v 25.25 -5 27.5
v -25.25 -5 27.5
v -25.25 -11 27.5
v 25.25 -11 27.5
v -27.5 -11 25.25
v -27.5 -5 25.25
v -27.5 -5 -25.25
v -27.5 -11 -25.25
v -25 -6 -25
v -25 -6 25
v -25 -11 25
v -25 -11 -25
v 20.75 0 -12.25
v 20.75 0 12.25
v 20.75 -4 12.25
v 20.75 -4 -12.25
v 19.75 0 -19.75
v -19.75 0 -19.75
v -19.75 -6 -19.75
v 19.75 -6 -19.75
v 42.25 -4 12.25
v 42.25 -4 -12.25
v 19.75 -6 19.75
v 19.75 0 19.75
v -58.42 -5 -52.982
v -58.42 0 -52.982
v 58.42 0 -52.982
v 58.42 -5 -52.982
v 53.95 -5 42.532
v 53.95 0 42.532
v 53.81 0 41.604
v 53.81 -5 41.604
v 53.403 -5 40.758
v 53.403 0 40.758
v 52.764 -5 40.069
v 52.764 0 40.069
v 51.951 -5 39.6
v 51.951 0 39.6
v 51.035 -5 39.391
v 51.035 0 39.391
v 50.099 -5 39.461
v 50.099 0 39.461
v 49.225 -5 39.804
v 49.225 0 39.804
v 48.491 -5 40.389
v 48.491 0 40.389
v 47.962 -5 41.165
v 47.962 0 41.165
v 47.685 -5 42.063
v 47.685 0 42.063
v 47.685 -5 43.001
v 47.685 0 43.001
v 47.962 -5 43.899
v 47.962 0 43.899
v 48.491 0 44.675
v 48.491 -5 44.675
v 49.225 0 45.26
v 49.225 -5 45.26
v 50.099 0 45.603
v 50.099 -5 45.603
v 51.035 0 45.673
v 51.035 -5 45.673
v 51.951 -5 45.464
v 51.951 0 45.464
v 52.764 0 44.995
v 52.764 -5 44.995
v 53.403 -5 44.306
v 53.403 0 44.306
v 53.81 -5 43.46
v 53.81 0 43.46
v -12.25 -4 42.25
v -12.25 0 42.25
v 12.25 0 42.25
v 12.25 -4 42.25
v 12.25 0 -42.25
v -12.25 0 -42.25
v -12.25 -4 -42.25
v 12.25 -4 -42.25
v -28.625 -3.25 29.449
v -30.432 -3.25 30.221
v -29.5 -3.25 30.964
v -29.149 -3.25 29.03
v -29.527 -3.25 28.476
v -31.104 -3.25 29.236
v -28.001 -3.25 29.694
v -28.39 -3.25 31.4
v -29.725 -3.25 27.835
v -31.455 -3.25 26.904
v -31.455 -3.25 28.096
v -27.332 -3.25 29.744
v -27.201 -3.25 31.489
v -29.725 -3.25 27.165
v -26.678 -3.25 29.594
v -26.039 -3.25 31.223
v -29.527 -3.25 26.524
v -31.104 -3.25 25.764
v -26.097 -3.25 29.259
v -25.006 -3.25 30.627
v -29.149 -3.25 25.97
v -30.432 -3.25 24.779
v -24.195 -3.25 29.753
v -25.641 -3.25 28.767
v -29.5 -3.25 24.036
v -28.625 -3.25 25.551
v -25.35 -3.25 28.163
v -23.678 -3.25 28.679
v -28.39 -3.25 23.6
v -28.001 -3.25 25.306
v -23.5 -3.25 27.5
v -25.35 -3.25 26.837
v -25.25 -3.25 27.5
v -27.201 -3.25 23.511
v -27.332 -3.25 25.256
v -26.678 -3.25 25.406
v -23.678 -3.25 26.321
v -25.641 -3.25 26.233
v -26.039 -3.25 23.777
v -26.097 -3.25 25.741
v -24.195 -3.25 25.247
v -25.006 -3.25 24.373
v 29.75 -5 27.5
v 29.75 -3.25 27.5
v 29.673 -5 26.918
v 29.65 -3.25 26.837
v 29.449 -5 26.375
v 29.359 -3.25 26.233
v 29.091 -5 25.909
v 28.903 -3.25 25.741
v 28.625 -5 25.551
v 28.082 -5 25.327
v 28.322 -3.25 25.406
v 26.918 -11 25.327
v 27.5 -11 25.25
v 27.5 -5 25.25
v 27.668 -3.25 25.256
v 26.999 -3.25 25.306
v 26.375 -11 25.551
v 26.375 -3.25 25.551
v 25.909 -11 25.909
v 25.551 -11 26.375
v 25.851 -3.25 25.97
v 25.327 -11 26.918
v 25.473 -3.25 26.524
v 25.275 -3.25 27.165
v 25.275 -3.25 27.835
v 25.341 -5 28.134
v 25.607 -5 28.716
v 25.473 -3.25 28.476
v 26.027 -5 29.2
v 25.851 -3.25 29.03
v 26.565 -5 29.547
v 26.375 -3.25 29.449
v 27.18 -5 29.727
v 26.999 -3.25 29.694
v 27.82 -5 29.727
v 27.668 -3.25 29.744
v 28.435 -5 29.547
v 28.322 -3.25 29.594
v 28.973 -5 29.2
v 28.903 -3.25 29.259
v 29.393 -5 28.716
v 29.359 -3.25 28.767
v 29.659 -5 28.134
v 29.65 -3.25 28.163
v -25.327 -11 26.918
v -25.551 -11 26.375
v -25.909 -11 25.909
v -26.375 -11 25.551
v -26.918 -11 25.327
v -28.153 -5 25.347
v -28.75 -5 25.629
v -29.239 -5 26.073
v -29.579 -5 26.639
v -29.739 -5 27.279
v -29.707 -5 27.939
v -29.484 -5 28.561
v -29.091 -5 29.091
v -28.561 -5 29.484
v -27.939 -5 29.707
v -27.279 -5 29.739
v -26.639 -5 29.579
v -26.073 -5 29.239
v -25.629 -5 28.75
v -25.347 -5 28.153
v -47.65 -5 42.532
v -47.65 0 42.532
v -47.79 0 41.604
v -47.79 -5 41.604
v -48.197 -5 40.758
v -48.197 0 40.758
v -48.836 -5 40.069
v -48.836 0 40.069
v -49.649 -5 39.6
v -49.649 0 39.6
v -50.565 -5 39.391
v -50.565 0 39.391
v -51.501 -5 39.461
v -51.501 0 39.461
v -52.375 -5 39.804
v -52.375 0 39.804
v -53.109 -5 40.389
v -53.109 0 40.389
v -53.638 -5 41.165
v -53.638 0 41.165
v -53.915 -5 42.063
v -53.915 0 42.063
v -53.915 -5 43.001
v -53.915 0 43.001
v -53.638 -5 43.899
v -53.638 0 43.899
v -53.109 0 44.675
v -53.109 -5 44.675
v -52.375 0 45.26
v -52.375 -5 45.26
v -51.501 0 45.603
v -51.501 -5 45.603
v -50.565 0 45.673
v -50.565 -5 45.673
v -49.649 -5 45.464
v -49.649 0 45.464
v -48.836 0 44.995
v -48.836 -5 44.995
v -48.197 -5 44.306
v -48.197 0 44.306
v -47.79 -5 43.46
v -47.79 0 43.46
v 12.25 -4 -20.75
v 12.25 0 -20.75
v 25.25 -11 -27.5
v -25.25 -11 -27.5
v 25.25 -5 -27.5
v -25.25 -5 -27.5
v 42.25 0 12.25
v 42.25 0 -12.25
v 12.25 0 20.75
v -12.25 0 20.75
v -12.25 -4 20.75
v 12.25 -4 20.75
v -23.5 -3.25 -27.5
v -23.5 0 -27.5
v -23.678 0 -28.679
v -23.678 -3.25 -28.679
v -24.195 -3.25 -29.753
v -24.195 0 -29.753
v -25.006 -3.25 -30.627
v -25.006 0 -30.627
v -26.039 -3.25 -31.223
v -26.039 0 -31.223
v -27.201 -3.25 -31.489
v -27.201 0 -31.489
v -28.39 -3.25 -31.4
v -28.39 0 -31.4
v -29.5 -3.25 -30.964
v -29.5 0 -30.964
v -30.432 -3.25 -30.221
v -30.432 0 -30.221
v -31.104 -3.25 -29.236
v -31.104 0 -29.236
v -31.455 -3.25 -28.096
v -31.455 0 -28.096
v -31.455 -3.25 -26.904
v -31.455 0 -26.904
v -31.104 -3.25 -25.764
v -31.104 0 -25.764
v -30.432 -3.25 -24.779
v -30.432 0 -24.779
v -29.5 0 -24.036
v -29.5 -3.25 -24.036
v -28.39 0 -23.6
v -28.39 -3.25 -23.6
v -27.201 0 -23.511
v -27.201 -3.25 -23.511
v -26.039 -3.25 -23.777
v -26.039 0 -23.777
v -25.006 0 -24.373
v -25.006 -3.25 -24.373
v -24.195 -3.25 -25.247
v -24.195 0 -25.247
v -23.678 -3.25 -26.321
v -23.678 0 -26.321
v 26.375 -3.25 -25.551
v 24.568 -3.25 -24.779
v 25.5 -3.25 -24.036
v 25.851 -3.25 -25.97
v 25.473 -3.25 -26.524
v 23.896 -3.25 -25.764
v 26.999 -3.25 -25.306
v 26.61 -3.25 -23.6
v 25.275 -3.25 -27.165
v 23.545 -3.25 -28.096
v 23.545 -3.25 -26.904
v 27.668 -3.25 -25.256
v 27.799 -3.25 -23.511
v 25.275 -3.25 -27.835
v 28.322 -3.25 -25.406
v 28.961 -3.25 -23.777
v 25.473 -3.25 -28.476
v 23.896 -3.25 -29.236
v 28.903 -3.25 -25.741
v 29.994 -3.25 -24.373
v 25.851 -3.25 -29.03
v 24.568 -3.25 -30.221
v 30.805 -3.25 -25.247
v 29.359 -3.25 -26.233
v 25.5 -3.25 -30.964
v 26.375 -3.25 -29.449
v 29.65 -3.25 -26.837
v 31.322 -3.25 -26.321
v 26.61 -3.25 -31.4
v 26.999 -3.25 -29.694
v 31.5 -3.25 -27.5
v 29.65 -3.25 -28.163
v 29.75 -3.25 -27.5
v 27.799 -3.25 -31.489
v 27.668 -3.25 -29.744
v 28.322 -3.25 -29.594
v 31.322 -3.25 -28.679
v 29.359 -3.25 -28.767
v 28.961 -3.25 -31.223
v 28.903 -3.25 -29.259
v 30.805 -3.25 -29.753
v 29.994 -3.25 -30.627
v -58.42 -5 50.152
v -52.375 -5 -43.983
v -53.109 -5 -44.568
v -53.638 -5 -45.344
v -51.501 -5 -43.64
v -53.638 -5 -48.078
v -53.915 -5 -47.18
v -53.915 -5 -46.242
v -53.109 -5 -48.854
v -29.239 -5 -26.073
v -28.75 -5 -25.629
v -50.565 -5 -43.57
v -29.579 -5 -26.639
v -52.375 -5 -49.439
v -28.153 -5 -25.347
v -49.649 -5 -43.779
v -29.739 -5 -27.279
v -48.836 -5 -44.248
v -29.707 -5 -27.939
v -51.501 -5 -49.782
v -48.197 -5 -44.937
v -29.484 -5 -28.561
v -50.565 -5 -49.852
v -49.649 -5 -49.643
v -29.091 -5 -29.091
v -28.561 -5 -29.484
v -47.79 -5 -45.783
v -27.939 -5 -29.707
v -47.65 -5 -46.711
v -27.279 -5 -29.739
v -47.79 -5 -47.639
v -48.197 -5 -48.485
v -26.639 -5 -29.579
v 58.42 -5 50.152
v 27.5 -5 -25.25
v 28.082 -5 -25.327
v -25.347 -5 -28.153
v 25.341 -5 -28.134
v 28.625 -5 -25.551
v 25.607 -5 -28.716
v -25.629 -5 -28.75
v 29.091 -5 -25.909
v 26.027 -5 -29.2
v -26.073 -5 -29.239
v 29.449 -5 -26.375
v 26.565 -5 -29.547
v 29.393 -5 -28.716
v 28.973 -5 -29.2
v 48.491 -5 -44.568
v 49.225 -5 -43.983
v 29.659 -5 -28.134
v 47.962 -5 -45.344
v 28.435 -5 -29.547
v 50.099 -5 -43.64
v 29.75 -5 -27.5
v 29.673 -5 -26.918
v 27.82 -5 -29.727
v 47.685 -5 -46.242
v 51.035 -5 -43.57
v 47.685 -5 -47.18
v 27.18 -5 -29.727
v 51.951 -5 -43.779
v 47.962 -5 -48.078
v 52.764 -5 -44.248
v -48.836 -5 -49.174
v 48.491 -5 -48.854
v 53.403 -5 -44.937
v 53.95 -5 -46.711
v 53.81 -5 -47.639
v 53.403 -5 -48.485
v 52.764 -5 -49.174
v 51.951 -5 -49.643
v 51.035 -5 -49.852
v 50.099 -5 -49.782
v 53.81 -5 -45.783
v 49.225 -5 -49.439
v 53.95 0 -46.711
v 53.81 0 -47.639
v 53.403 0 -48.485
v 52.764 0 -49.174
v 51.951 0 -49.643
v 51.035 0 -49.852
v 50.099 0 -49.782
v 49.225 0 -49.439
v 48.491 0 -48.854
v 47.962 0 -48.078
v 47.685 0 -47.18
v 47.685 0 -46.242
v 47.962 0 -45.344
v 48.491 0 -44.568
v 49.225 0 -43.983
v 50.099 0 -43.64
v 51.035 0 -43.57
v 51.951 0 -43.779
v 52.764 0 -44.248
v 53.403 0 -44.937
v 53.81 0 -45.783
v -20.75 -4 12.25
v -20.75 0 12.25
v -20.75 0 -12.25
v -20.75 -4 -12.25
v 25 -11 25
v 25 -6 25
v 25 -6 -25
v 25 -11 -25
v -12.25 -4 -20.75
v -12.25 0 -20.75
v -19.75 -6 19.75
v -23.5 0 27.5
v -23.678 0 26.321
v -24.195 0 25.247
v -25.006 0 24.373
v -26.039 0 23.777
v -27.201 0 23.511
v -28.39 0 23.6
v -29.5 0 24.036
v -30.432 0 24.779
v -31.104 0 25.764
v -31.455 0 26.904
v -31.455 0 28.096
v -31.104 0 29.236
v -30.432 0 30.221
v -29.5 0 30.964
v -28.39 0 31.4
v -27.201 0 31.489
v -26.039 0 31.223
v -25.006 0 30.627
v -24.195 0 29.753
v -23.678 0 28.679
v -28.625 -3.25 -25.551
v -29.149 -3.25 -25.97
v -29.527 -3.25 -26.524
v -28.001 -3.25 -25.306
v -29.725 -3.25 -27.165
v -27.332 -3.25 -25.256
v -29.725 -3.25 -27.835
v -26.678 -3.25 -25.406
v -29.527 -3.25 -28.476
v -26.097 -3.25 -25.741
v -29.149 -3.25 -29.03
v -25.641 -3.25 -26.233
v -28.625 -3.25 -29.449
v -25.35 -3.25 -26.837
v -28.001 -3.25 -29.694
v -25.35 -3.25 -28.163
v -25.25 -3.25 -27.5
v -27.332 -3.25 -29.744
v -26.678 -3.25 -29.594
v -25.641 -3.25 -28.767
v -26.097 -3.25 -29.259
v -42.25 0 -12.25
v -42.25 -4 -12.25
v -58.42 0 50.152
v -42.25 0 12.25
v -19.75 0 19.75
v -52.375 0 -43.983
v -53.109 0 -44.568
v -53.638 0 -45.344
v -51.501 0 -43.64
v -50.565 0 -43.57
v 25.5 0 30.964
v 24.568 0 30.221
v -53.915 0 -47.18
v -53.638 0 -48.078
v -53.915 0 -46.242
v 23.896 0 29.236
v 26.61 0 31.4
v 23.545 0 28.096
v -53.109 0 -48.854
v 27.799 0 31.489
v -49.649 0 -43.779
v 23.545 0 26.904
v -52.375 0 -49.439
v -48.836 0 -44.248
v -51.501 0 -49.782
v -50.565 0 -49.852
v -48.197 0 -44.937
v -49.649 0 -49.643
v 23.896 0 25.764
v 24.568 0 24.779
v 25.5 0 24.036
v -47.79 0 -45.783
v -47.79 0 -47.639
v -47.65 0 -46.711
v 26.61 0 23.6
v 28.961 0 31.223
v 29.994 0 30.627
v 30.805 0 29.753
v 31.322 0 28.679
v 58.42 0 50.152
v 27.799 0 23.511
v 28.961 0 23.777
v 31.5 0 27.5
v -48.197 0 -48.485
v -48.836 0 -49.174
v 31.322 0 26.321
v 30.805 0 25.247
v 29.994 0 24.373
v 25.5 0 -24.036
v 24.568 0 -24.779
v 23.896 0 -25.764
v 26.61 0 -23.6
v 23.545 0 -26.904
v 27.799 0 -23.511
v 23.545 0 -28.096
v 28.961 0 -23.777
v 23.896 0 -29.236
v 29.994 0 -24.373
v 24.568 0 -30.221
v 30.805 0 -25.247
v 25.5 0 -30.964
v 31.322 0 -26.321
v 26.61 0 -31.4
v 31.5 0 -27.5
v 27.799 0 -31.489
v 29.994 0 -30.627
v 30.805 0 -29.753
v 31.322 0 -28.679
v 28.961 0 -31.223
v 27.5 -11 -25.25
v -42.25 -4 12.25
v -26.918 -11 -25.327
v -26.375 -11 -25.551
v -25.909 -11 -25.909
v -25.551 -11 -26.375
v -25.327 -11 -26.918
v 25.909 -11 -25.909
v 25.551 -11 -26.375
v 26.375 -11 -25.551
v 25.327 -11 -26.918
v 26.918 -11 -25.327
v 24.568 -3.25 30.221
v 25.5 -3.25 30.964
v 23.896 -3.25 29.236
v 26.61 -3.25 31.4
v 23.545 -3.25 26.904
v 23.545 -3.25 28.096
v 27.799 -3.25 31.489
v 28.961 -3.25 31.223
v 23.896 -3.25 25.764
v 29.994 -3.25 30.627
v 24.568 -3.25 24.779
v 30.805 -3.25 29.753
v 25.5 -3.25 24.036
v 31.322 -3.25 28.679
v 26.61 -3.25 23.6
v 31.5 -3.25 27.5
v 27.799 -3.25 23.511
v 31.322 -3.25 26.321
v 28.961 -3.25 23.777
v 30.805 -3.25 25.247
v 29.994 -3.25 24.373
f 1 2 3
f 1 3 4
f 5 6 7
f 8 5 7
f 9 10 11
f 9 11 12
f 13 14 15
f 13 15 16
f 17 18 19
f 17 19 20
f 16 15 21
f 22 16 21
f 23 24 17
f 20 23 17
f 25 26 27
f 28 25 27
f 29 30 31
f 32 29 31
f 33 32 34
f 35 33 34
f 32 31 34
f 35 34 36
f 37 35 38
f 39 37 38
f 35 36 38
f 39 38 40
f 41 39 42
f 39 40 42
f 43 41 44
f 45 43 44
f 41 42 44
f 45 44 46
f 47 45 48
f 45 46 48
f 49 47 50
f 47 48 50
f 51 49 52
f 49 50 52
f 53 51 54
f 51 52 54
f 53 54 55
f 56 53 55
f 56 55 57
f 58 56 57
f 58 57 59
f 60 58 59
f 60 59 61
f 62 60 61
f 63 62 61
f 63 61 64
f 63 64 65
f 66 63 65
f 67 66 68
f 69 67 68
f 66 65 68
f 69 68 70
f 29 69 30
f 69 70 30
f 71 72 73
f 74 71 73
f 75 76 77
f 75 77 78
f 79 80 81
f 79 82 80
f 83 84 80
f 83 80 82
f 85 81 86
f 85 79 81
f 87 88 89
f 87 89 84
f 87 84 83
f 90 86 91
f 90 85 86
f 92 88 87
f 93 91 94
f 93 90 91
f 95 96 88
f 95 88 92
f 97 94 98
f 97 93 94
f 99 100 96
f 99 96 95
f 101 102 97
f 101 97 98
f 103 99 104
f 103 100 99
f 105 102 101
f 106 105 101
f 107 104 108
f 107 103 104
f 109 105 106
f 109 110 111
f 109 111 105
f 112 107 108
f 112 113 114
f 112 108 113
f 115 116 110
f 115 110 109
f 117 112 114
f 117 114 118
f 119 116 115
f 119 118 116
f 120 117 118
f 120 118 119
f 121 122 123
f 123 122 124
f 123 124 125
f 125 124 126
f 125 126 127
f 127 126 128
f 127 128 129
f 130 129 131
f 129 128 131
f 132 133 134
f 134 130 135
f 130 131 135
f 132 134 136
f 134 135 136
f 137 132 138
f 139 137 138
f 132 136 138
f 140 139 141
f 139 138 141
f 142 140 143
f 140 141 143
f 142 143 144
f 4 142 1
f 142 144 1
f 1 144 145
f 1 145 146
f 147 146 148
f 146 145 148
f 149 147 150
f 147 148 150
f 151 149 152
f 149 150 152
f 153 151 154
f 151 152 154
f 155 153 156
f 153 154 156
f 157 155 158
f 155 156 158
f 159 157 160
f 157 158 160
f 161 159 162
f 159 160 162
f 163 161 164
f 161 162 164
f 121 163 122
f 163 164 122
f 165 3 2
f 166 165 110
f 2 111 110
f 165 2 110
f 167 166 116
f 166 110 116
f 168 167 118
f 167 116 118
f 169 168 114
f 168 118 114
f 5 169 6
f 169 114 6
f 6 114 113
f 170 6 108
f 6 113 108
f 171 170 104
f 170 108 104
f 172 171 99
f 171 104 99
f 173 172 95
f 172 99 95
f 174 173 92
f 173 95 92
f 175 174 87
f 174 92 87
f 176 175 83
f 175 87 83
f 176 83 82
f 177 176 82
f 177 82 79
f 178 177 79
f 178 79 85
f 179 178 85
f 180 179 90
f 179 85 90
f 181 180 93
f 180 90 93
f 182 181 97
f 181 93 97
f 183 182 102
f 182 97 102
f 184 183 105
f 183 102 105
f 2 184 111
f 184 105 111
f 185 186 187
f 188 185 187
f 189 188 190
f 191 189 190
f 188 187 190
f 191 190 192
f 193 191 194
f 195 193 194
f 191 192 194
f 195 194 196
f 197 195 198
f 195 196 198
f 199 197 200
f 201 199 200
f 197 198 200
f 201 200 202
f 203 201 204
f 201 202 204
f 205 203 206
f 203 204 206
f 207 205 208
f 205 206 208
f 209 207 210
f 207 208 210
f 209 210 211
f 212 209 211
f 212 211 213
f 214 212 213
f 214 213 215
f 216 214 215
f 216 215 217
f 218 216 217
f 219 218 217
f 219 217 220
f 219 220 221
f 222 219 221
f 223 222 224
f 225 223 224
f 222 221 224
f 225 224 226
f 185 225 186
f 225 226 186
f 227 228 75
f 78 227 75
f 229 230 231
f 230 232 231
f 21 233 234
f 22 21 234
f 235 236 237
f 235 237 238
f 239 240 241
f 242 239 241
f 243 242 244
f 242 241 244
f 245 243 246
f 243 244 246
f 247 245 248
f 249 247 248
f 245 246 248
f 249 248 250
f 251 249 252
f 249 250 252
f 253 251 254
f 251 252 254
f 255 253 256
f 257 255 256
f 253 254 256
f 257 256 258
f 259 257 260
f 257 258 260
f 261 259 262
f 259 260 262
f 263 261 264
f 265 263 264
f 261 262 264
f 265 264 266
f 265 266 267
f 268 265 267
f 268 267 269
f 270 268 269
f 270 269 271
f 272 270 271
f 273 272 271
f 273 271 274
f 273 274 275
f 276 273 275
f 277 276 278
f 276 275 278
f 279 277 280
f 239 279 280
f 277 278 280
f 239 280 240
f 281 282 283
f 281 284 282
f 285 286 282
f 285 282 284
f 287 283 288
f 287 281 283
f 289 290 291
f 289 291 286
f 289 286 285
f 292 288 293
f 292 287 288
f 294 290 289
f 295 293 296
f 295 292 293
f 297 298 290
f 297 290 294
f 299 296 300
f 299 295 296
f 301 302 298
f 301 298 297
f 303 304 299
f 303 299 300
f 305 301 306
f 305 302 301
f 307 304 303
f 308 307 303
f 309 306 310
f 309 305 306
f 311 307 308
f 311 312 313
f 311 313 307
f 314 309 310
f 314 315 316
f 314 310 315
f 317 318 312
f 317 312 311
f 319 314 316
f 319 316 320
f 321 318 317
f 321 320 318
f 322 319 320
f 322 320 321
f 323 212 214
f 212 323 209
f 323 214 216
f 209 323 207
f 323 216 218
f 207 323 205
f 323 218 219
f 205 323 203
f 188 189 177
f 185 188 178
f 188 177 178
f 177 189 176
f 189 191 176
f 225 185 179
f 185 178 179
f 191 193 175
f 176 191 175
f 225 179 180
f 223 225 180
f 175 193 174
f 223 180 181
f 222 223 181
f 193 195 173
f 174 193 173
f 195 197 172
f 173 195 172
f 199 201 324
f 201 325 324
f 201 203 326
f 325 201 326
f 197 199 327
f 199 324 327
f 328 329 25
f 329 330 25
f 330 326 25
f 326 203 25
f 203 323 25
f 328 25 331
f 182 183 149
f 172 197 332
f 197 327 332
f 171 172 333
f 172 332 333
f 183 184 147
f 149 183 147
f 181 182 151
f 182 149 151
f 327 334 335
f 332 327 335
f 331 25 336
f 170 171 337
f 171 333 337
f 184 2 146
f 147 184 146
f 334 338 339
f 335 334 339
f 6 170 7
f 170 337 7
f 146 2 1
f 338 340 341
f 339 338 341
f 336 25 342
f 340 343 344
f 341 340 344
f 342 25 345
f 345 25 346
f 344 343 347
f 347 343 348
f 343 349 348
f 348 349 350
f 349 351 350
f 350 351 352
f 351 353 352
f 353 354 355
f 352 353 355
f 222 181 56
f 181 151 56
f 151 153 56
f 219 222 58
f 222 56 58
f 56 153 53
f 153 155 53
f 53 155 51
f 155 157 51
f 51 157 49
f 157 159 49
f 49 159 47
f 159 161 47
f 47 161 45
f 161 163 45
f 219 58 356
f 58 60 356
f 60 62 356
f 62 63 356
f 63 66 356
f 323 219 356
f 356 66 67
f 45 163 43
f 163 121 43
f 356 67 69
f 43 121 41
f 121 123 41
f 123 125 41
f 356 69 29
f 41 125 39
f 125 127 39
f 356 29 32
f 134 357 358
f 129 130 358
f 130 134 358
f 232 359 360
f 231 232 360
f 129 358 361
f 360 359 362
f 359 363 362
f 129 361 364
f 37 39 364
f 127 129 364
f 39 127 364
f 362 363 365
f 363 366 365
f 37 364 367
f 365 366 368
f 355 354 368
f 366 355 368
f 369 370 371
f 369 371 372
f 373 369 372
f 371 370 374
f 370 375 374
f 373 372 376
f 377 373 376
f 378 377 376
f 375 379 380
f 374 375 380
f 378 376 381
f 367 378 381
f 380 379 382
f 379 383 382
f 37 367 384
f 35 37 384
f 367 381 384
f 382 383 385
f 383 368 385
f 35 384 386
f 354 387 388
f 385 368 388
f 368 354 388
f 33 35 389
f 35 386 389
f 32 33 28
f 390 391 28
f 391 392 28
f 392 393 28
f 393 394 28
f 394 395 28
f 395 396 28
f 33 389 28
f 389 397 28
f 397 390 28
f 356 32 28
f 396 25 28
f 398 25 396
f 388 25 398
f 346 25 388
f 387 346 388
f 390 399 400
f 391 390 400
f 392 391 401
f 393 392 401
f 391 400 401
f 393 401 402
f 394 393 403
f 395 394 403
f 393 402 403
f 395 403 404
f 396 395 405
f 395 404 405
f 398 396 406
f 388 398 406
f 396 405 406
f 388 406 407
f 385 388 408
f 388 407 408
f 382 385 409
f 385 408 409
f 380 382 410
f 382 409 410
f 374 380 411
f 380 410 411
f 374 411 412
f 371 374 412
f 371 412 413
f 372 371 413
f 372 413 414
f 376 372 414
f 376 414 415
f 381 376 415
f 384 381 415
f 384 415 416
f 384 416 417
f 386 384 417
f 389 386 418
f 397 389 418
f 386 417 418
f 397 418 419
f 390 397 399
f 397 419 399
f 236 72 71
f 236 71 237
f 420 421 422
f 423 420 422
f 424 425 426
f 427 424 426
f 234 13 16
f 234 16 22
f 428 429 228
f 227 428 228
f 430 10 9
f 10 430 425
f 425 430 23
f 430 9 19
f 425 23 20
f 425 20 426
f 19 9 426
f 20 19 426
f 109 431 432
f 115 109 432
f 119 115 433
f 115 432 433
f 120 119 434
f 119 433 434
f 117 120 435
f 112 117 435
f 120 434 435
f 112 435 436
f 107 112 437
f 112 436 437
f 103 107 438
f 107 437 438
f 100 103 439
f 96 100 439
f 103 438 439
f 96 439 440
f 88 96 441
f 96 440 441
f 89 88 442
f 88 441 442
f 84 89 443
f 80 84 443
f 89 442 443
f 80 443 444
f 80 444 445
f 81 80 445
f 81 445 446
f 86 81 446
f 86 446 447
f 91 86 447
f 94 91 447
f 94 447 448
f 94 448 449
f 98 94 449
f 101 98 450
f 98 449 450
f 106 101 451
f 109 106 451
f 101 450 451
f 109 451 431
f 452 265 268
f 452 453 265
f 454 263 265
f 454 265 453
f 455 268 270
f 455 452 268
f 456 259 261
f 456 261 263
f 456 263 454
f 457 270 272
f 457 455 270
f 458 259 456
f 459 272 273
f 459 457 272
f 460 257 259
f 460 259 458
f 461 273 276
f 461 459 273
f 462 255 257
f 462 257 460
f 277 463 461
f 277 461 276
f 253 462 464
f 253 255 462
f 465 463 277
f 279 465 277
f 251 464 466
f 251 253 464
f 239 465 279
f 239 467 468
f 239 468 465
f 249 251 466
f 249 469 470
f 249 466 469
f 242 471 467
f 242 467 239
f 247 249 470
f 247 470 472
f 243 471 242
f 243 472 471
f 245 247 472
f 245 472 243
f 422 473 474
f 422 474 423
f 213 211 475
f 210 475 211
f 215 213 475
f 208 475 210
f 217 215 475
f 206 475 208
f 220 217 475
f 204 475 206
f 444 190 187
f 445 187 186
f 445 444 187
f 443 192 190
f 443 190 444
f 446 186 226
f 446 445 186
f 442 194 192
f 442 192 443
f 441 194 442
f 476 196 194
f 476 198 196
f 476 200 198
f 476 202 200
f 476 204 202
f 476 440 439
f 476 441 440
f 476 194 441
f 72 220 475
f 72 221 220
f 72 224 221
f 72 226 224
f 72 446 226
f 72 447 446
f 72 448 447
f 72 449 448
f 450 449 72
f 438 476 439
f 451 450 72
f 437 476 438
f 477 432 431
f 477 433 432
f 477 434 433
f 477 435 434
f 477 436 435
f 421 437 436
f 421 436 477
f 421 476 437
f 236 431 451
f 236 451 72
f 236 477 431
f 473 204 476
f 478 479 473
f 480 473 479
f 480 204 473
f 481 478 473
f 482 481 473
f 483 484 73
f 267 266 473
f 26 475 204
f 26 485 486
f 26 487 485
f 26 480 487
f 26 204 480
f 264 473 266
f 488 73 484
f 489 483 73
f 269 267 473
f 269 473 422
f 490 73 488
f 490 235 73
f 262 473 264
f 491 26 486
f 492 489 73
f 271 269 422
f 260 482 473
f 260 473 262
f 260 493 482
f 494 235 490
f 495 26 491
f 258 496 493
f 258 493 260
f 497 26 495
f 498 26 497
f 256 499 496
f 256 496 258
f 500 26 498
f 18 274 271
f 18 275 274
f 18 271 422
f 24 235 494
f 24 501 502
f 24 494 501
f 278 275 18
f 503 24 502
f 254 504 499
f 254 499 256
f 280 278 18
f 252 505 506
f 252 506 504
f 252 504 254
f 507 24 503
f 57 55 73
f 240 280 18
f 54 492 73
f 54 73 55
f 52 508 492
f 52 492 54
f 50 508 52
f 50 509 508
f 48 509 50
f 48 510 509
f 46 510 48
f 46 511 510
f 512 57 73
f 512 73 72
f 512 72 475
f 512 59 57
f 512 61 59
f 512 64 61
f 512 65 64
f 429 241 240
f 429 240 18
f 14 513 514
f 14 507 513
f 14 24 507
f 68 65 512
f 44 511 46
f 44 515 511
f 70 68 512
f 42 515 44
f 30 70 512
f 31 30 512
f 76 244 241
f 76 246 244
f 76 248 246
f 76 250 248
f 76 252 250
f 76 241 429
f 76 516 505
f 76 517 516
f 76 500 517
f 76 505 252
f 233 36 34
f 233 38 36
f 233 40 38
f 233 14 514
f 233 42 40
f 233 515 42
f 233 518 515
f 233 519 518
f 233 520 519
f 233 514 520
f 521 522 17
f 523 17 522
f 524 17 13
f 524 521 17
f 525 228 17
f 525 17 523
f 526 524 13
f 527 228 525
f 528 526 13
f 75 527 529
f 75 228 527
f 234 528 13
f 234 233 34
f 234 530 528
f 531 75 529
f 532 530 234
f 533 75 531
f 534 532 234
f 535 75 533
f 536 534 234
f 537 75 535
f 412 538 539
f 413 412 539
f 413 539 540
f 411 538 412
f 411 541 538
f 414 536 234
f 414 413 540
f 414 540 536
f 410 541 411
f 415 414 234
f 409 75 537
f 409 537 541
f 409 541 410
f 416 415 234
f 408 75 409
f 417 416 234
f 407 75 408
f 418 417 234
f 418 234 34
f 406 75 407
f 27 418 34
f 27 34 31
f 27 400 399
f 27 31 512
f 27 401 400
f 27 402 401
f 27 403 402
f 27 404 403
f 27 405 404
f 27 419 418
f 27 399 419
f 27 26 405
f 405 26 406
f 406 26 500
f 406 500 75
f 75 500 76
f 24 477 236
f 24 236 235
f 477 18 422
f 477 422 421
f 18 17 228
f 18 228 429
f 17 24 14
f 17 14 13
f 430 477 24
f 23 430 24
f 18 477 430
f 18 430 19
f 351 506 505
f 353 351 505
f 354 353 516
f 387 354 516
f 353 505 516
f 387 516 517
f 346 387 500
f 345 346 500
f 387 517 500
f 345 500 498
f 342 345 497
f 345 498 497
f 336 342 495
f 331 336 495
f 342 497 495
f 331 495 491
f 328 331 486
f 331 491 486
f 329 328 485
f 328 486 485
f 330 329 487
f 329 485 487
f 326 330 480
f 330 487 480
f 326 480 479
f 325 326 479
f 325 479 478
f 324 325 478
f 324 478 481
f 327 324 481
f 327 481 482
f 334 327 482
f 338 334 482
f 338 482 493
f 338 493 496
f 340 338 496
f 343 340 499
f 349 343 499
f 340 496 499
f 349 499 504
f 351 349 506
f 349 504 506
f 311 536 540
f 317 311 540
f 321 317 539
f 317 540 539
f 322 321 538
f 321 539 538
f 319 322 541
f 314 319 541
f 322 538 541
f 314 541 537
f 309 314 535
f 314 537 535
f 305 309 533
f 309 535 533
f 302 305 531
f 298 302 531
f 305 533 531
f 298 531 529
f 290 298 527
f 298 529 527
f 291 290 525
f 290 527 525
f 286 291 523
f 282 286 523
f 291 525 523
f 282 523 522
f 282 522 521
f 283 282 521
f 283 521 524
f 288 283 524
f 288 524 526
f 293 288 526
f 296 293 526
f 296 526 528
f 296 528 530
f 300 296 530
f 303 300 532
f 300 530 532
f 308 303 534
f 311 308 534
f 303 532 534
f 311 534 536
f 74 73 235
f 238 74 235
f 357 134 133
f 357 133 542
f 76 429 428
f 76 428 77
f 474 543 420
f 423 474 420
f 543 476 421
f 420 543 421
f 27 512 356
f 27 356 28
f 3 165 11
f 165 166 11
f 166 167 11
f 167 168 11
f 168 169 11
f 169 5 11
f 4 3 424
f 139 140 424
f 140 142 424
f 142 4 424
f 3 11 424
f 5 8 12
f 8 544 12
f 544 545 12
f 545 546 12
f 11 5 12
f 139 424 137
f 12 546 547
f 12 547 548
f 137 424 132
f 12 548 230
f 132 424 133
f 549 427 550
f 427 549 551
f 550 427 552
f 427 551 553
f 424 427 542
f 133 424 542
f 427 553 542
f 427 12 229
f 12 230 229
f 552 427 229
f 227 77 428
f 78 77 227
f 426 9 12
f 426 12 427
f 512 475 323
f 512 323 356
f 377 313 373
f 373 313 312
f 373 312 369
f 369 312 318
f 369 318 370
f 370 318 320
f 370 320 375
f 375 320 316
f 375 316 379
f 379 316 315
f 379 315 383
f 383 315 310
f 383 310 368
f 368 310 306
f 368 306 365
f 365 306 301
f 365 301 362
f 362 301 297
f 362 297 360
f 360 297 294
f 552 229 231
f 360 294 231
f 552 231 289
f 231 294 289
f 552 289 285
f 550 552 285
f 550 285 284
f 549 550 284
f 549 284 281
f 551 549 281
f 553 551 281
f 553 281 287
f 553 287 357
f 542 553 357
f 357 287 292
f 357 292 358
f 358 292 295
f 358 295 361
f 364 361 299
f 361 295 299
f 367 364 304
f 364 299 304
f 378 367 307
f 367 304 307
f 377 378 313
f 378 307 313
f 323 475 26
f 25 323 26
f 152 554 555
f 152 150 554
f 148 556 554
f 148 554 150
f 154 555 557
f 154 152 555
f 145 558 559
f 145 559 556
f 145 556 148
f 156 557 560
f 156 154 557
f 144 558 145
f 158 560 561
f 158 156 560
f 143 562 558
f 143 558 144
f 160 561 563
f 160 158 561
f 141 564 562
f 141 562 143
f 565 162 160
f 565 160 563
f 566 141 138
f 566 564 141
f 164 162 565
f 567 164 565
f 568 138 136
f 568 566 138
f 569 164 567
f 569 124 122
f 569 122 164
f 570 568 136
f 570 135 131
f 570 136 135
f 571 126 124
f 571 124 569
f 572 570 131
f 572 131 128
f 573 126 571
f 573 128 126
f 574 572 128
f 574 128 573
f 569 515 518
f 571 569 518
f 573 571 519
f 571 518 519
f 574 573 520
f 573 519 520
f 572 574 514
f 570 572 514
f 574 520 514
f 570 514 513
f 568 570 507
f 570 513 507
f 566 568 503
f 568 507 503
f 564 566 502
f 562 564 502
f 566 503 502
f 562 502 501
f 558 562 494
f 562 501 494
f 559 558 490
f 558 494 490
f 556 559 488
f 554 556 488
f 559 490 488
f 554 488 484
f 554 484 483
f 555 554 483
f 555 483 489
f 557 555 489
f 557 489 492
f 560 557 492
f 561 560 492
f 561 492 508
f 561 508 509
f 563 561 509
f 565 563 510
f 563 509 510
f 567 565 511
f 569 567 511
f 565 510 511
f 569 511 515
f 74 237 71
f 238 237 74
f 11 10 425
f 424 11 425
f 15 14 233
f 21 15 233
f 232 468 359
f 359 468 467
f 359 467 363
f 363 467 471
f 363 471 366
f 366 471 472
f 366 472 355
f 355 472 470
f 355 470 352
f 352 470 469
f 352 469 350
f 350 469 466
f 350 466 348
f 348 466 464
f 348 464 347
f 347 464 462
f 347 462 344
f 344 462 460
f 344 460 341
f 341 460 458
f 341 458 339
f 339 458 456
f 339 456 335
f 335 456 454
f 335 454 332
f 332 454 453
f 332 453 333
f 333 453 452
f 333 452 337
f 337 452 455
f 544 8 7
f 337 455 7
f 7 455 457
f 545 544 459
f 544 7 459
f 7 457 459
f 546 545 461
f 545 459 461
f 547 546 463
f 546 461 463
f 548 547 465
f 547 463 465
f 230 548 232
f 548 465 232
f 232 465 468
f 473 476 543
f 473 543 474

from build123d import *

# Parameters (mm, degrees)
SKETCH1_W              = 116.84
SKETCH1_H              = 103.134084814
SKETCH1_R              = 3.15
BOSS_EXTRUDE1_DEPTH    = 5
SKETCH12_W             = 85
SKETCH12_H             = 23.975046692
BOSS_EXTRUDE15_DEPTH   = 5
SKETCH17_W             = 50
SKETCH17_H             = 50
BOSS_EXTRUDE18_DEPTH   = 6
SKETCH10_W             = 39.5
SKETCH10_H             = 39.5
BOSS_EXTRUDE19_DEPTH   = 25
SKETCH19_W             = 55
SKETCH19_H             = 55
BOSS_EXTRUDE20_DEPTH   = 11
SKETCH20_R             = 2.25
BOSS_EXTRUDE22_DEPTH   = 25
BOSS_EXTRUDE22_2_DEPTH = 25
BOSS_EXTRUDE22_3_DEPTH = 25
BOSS_EXTRUDE22_4_DEPTH = 25
SKETCH21_W             = 24.5
SKETCH21_H             = 21.5
BOSS_EXTRUDE23_DEPTH   = 4
SKETCH21_W_2           = 21.5
SKETCH21_H_2           = 24.5
BOSS_EXTRUDE23_2_DEPTH = 4
BOSS_EXTRUDE23_3_DEPTH = 4
BOSS_EXTRUDE23_4_DEPTH = 4
SKETCH25_R             = 4
BOSS_EXTRUDE24_DEPTH   = 3.25
BOSS_EXTRUDE24_2_DEPTH = 3.25
BOSS_EXTRUDE24_3_DEPTH = 3.25
BOSS_EXTRUDE24_4_DEPTH = 3.25


with BuildPart() as part:
    # Sketch1 → Boss-Extrude1 (new body)
    with BuildSketch(Plane(origin=(0, 0, 0), x_dir=(1, 0, 0), z_dir=(0, 1, 0))):
        with Locations((0, 1.415042407)):
            Rectangle(SKETCH1_W, SKETCH1_H)
        with Locations((-50.8, 46.711)):
            Circle(SKETCH1_R, mode=Mode.SUBTRACT)
        with Locations((50.8, -42.532)):
            Circle(SKETCH1_R, mode=Mode.SUBTRACT)
        with Locations((-50.8, -42.532)):
            Circle(SKETCH1_R, mode=Mode.SUBTRACT)
        with Locations((50.8, 46.711)):
            Circle(SKETCH1_R, mode=Mode.SUBTRACT)
    extrude(amount=-BOSS_EXTRUDE1_DEPTH)


with BuildPart() as body_2:
    # Sketch12 → Boss-Extrude15 (new body)
    with BuildSketch(Plane(origin=(0, 0, 0), x_dir=(1, 0, 0), z_dir=(0, 1, 0))):
        with Locations((0, 58)):
            Rectangle(SKETCH12_W, SKETCH12_H)
    extrude(amount=BOSS_EXTRUDE15_DEPTH)


with BuildPart() as body_3:
    # Sketch17 → Boss-Extrude18 (new body)
    with BuildSketch(Plane(origin=(0, 0, 0), x_dir=(1, 0, 0), z_dir=(0, 1, 0))):
        Rectangle(SKETCH17_W, SKETCH17_H)
    extrude(amount=-BOSS_EXTRUDE18_DEPTH)


with BuildPart() as body_4:
    # Sketch10 → Boss-Extrude19 (new body, symmetric)
    with BuildSketch(Plane(origin=(0, 0, 0), x_dir=(1, 0, 0), z_dir=(0, 1, 0))):
        Rectangle(SKETCH10_W, SKETCH10_H)
    extrude(amount=BOSS_EXTRUDE19_DEPTH, both=True)


with BuildPart() as body_5:
    # Sketch19 → Boss-Extrude20 (new body)
    with BuildSketch(Plane(origin=(0, 0, 0), x_dir=(1, 0, 0), z_dir=(0, 1, 0))):
        Rectangle(SKETCH19_W, SKETCH19_H)
    extrude(amount=-BOSS_EXTRUDE20_DEPTH)


with BuildPart() as part_1:
    add(part.part)

    # Combine1: cut body 2
    add(body_2.part, mode=Mode.SUBTRACT)


with BuildPart() as body_3_1:
    # Body-Move/Copy4: moved
    add(body_3.part.moved(Location((0, -6, 0))))


with BuildPart() as body_5_1:
    add(body_5.part)

    # Combine4: cut body 3
    add(body_3_1.part, mode=Mode.SUBTRACT)

    # Combine7: union part
    add(part_1.part)

    # Combine8: cut body 4
    add(body_4.part, mode=Mode.SUBTRACT)


with BuildPart() as body_2_2:
    # Sketch20 → Boss-Extrude22 (new body, symmetric)
    with BuildSketch(Plane(origin=(0, 0, 0), x_dir=(1, 0, 0), z_dir=(0, 1, 0))):
        with Locations((27.5, 27.5)):
            Circle(SKETCH20_R)
    extrude(amount=BOSS_EXTRUDE22_DEPTH, both=True)


with BuildPart() as body_3_2:
    # Sketch20 → Boss-Extrude22 2 (new body, symmetric)
    with BuildSketch(Plane(origin=(0, 0, 0), x_dir=(1, 0, 0), z_dir=(0, 1, 0))):
        with Locations((27.5, -27.5)):
            Circle(SKETCH20_R)
    extrude(amount=BOSS_EXTRUDE22_2_DEPTH, both=True)


with BuildPart() as body_4_2:
    # Sketch20 → Boss-Extrude22 3 (new body, symmetric)
    with BuildSketch(Plane(origin=(0, 0, 0), x_dir=(1, 0, 0), z_dir=(0, 1, 0))):
        with Locations((-27.5, -27.5)):
            Circle(SKETCH20_R)
    extrude(amount=BOSS_EXTRUDE22_3_DEPTH, both=True)


with BuildPart() as body_5_2:
    # Sketch20 → Boss-Extrude22 4 (new body, symmetric)
    with BuildSketch(Plane(origin=(0, 0, 0), x_dir=(1, 0, 0), z_dir=(0, 1, 0))):
        with Locations((-27.5, 27.5)):
            Circle(SKETCH20_R)
    extrude(amount=BOSS_EXTRUDE22_4_DEPTH, both=True)


with BuildPart() as body_5_3:
    add(body_5_1.part)

    # Combine9: cut body 4 2, body 3 2, body 2 2, body 5 2
    add(body_4_2.part, mode=Mode.SUBTRACT)
    add(body_3_2.part, mode=Mode.SUBTRACT)
    add(body_2_2.part, mode=Mode.SUBTRACT)
    add(body_5_2.part, mode=Mode.SUBTRACT)


with BuildPart() as body_2_3:
    # Sketch21 → Boss-Extrude23 (new body)
    with BuildSketch(Plane(origin=(0, 0, 0), x_dir=(1, 0, 0), z_dir=(0, 1, 0))):
        with Locations((0, 31.5)):
            Rectangle(SKETCH21_W, SKETCH21_H)
    extrude(amount=-BOSS_EXTRUDE23_DEPTH)


with BuildPart() as body_3_3:
    # Sketch21 → Boss-Extrude23 2 (new body)
    with BuildSketch(Plane(origin=(0, 0, 0), x_dir=(1, 0, 0), z_dir=(0, 1, 0))):
        with Locations((31.5, 0)):
            Rectangle(SKETCH21_W_2, SKETCH21_H_2)
    extrude(amount=-BOSS_EXTRUDE23_2_DEPTH)


with BuildPart() as body_4_3:
    # Sketch21 → Boss-Extrude23 3 (new body)
    with BuildSketch(Plane(origin=(0, 0, 0), x_dir=(1, 0, 0), z_dir=(0, 1, 0))):
        with Locations((-31.5, 0)):
            Rectangle(SKETCH21_W_2, SKETCH21_H_2)
    extrude(amount=-BOSS_EXTRUDE23_3_DEPTH)


with BuildPart() as body_5_3_1:
    # Sketch21 → Boss-Extrude23 4 (new body)
    with BuildSketch(Plane(origin=(0, 0, 0), x_dir=(1, 0, 0), z_dir=(0, 1, 0))):
        with Locations((0, -31.5)):
            Rectangle(SKETCH21_W, SKETCH21_H)
    extrude(amount=-BOSS_EXTRUDE23_4_DEPTH)


with BuildPart() as body_5_4:
    add(body_5_3.part)

    # Combine10: cut body 3 3, body 2 3, body 5 3, body 4 3
    add(body_3_3.part, mode=Mode.SUBTRACT)
    add(body_2_3.part, mode=Mode.SUBTRACT)
    add(body_5_3_1.part, mode=Mode.SUBTRACT)
    add(body_4_3.part, mode=Mode.SUBTRACT)


with BuildPart() as body_2_4:
    # Sketch25 → Boss-Extrude24 (new body)
    with BuildSketch(Plane(origin=(0, 0, 0), x_dir=(1, 0, 0), z_dir=(0, 1, 0))):
        with Locations((27.5, 27.5)):
            Circle(SKETCH25_R)
    extrude(amount=-BOSS_EXTRUDE24_DEPTH)


with BuildPart() as body_3_4:
    # Sketch25 → Boss-Extrude24 2 (new body)
    with BuildSketch(Plane(origin=(0, 0, 0), x_dir=(1, 0, 0), z_dir=(0, 1, 0))):
        with Locations((-27.5, 27.5)):
            Circle(SKETCH25_R)
    extrude(amount=-BOSS_EXTRUDE24_2_DEPTH)


with BuildPart() as body_4_4:
    # Sketch25 → Boss-Extrude24 3 (new body)
    with BuildSketch(Plane(origin=(0, 0, 0), x_dir=(1, 0, 0), z_dir=(0, 1, 0))):
        with Locations((-27.5, -27.5)):
            Circle(SKETCH25_R)
    extrude(amount=-BOSS_EXTRUDE24_3_DEPTH)


with BuildPart() as body_5_4_1:
    # Sketch25 → Boss-Extrude24 4 (new body)
    with BuildSketch(Plane(origin=(0, 0, 0), x_dir=(1, 0, 0), z_dir=(0, 1, 0))):
        with Locations((27.5, -27.5)):
            Circle(SKETCH25_R)
    extrude(amount=-BOSS_EXTRUDE24_4_DEPTH)


with BuildPart() as body_5_5:
    add(body_5_4.part)

    # Combine11: cut body 4 4, body 3 4, body 2 4, body 5 4
    add(body_4_4.part, mode=Mode.SUBTRACT)
    add(body_3_4.part, mode=Mode.SUBTRACT)
    add(body_2_4.part, mode=Mode.SUBTRACT)
    add(body_5_4_1.part, mode=Mode.SUBTRACT)


solid = body_5_5.part
